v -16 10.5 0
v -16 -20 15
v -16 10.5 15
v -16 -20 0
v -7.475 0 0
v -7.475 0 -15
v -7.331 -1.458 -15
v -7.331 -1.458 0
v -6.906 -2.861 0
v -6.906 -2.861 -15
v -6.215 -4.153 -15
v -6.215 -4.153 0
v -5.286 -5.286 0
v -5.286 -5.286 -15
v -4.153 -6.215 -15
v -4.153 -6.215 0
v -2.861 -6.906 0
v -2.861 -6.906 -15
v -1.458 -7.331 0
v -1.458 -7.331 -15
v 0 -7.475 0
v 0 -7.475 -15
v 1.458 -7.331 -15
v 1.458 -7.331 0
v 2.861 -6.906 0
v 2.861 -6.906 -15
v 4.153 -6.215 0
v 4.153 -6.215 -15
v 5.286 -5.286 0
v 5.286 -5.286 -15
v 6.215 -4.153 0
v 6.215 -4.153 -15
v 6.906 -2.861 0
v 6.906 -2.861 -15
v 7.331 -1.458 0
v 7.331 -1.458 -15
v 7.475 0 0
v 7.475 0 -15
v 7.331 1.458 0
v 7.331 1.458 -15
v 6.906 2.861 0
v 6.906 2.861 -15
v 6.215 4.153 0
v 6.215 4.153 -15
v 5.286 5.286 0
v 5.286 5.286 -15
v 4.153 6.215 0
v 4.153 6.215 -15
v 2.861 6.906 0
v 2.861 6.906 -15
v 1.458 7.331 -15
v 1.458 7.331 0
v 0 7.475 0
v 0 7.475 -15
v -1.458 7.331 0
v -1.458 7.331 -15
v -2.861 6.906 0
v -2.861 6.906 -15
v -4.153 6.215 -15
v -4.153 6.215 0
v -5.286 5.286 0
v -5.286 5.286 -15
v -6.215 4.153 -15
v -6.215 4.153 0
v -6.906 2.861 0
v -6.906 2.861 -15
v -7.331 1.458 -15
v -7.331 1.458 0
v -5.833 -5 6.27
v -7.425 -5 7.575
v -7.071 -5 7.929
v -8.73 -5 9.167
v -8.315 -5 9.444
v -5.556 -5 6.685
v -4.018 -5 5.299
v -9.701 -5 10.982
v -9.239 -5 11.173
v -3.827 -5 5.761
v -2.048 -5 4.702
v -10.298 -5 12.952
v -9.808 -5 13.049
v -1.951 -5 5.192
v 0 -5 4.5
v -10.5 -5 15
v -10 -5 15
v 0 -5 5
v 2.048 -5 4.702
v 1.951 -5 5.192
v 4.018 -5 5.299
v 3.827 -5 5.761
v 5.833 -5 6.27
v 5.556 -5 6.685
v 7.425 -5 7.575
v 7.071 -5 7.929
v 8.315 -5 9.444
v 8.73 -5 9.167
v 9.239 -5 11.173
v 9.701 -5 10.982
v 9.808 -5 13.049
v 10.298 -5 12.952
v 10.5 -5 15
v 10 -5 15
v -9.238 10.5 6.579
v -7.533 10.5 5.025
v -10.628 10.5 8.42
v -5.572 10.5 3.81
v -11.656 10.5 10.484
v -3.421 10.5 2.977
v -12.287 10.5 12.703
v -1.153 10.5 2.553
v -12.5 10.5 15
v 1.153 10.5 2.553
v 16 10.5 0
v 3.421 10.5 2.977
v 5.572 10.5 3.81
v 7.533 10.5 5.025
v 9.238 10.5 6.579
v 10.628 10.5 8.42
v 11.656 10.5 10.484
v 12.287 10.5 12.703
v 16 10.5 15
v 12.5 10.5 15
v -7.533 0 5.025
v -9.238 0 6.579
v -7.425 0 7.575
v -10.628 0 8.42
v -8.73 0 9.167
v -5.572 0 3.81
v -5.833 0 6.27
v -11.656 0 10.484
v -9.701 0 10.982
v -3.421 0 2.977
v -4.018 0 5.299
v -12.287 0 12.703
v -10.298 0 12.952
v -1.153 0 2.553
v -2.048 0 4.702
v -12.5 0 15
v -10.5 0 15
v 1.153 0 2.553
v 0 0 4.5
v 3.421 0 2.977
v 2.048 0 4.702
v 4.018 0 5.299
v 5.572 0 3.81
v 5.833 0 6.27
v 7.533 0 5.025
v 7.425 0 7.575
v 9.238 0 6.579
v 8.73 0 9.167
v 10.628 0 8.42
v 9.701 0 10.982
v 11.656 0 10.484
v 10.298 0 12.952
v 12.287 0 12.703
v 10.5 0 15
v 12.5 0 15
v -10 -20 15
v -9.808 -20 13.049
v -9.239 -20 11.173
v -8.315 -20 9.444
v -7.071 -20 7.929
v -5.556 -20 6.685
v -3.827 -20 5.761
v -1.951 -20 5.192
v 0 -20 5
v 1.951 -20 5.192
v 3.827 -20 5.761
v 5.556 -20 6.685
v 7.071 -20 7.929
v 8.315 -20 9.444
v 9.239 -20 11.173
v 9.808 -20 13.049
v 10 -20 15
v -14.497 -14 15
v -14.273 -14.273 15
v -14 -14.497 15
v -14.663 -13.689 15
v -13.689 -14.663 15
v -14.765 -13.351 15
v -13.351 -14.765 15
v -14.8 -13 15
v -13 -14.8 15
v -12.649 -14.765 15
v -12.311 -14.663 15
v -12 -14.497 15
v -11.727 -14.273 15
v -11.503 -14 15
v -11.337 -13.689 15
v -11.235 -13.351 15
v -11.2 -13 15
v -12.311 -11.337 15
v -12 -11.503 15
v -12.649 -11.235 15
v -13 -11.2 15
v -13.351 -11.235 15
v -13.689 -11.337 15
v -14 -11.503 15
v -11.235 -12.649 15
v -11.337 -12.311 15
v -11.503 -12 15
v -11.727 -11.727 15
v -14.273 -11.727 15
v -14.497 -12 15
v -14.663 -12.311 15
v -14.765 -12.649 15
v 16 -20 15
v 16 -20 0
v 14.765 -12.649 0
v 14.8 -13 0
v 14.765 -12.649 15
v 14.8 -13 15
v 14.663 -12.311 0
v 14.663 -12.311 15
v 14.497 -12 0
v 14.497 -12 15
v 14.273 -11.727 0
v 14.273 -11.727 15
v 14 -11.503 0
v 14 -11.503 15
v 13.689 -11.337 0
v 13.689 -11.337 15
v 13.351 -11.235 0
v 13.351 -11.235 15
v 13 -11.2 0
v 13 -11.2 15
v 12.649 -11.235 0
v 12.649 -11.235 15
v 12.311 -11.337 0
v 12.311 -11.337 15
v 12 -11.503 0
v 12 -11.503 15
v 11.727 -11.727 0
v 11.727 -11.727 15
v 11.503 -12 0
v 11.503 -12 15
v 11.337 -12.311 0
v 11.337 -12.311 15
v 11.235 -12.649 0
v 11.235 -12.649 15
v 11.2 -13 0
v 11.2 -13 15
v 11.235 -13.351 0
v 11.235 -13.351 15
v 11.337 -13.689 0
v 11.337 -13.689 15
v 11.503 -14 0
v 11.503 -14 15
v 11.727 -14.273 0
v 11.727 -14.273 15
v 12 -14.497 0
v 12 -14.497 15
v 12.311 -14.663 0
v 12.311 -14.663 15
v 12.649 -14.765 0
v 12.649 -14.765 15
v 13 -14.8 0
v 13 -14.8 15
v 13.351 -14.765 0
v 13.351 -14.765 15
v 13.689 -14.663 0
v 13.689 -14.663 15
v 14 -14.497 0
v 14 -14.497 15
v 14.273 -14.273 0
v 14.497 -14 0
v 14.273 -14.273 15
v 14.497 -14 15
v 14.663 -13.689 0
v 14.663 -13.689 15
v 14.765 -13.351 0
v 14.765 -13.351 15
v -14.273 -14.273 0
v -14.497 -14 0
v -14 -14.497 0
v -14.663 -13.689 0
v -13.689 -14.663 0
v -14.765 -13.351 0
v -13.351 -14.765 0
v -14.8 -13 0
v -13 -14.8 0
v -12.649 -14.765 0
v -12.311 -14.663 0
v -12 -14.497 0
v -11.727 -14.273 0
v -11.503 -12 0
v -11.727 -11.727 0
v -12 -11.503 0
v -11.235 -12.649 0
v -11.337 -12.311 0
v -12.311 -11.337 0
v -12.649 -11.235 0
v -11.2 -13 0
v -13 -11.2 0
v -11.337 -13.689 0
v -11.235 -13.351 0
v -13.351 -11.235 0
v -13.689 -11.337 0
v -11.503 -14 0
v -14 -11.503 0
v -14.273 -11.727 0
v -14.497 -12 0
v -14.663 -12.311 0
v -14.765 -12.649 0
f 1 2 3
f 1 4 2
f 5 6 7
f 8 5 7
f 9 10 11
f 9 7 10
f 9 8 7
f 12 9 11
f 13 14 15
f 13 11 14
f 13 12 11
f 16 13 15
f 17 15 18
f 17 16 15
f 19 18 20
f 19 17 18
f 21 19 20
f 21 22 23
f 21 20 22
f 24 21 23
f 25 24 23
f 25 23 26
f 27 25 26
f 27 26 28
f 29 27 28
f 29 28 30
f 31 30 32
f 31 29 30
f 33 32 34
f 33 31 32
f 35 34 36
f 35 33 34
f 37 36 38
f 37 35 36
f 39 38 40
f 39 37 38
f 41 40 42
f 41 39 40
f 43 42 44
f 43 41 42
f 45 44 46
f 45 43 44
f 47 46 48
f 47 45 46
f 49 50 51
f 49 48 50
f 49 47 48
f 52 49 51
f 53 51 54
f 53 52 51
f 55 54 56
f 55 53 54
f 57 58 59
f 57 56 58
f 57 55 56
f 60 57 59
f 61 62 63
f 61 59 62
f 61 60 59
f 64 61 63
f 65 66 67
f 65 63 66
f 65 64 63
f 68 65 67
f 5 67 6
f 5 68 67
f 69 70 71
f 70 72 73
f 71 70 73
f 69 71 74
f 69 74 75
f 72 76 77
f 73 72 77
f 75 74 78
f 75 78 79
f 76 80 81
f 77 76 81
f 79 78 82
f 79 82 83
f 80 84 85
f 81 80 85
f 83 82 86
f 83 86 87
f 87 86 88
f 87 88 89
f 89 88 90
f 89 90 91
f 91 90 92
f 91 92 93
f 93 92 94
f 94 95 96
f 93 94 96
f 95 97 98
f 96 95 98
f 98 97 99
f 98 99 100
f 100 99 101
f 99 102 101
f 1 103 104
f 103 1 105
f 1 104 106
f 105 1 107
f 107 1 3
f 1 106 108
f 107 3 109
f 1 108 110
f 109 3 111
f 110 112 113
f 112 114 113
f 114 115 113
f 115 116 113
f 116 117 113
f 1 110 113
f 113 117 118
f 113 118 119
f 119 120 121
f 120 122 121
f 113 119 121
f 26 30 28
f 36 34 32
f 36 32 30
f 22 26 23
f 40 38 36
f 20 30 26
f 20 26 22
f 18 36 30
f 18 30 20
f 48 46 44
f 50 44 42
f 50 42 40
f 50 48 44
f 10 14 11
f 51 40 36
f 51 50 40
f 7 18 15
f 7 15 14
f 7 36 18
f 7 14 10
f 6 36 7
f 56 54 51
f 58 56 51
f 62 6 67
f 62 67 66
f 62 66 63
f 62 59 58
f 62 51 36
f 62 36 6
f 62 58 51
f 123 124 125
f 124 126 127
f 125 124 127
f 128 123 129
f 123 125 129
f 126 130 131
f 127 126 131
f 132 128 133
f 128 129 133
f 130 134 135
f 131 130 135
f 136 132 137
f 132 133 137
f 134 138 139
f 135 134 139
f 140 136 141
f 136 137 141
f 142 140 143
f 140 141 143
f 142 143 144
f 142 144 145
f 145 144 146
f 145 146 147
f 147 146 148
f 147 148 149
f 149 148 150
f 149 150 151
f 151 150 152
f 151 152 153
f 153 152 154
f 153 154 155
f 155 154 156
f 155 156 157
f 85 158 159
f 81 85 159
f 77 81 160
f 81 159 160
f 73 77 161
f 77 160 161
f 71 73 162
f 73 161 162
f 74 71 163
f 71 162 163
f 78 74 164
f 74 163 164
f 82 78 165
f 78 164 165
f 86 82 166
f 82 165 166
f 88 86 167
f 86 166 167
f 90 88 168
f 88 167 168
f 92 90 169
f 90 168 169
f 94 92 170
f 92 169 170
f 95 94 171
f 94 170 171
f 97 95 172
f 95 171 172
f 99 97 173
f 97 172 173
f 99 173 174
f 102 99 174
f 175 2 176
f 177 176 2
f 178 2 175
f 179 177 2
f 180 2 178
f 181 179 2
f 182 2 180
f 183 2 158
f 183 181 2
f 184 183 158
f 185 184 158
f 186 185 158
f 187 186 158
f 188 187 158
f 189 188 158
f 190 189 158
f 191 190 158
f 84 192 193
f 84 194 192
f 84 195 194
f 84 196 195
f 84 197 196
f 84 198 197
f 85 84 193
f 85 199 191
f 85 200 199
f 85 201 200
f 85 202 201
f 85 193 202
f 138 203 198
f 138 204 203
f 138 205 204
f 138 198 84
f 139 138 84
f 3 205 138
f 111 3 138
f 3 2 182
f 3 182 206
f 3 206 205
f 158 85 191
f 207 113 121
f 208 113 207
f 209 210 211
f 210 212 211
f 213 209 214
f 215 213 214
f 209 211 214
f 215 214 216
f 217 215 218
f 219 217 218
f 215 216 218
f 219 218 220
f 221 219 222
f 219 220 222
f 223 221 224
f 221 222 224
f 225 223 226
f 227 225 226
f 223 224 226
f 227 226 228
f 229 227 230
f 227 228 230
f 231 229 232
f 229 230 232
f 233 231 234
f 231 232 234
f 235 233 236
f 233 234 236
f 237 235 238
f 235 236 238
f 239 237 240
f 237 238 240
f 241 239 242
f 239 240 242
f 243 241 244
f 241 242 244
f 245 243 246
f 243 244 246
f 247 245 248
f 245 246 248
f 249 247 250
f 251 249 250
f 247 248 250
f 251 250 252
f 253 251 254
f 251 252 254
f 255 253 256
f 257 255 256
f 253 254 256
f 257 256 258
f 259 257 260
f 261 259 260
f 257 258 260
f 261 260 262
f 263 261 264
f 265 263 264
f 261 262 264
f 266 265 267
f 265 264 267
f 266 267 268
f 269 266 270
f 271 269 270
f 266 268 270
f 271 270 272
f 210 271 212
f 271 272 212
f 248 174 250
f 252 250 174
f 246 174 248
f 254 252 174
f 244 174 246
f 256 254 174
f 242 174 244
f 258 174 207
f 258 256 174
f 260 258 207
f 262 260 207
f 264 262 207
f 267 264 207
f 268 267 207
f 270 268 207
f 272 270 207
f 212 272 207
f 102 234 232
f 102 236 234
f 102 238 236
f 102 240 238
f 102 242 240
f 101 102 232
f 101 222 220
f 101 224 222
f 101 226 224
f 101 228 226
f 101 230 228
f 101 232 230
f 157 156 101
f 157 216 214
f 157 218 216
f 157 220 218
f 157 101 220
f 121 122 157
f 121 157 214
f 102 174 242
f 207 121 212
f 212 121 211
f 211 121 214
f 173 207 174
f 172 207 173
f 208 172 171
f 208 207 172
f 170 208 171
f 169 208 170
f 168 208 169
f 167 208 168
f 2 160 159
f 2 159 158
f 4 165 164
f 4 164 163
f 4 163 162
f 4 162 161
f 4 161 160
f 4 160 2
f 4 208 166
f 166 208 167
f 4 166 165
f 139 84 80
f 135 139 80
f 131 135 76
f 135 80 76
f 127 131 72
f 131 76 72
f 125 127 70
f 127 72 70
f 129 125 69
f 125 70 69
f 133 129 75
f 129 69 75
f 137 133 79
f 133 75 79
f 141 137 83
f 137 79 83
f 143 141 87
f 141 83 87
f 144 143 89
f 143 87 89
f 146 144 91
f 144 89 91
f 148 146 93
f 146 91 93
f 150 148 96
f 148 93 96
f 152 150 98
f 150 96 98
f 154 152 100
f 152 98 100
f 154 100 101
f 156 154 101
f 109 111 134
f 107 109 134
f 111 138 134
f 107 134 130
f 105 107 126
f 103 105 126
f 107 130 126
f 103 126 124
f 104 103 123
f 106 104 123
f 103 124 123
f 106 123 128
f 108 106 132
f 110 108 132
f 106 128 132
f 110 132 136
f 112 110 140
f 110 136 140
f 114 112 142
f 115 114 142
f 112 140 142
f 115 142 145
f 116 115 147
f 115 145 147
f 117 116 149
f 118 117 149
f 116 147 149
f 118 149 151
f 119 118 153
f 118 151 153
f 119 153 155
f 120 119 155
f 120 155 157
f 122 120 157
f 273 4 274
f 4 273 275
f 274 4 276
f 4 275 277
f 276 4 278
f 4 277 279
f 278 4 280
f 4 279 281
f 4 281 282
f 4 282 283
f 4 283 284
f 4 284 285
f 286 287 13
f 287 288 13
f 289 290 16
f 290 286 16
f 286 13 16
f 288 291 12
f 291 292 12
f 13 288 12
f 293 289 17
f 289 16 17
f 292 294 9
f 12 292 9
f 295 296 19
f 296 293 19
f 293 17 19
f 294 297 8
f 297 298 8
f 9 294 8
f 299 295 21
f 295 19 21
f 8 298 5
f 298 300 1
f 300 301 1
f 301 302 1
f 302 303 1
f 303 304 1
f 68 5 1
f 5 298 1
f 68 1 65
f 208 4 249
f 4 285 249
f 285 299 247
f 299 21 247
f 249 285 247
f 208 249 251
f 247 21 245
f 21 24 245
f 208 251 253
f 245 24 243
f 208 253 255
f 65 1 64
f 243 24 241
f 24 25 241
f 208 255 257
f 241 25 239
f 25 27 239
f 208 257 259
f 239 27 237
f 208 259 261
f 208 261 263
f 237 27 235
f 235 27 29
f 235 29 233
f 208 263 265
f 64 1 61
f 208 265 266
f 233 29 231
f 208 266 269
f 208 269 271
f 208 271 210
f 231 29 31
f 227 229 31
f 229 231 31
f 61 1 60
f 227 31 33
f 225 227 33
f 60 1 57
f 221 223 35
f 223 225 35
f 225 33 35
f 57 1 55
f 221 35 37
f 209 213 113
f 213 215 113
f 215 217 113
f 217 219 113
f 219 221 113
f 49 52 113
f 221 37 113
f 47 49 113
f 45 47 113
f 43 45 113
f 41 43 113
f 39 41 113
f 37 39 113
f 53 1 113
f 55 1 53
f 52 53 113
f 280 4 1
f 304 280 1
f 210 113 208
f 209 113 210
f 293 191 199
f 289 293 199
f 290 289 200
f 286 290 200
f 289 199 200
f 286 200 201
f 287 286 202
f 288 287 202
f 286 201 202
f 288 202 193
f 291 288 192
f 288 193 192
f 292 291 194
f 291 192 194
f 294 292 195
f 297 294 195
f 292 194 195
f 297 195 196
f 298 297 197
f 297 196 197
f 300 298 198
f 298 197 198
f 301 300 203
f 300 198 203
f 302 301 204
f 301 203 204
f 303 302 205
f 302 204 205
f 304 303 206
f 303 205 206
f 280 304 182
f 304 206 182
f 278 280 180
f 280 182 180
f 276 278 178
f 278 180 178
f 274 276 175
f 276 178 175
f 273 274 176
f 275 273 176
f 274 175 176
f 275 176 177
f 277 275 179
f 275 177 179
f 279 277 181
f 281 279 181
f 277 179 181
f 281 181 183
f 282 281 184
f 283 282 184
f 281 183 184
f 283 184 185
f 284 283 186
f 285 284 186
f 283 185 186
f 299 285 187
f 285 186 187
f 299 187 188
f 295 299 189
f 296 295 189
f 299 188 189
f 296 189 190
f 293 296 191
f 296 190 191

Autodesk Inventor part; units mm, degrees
ref_plane "YZ Plane" through (0, 0, 0) normal (1, 0, 0) x (0, 1, 0)
ref_plane "XZ Plane" through (0, 0, 0) normal (0, 1, 0) x (-1, 0, 0)
ref_plane "XY Plane" through (0, 0, 0) normal (0, 0, 1) x (1, 0, 0)
sketch "Skizze1" plane through (0, 0, 0) normal (0, 0, 1) x (1, 0, 0)
  line L0 (-16, 20) -> (16, 20)
  line L1 (16, 20) -> (16, -20)
  line L2 (16, -20) -> (-16, -20)
  line L3 (-16, -20) -> (-16, 20)
  line L4 (-16, 20) -> (16, -20) construction
  line L5 (16, 20) -> (-16, -20) construction
  point P0 (0, 0)
  dimension "d0" = 32
  dimension "d1" = 40
extrude "Extrusion1" add sketch "Skizze1" along normal blind 15
sketch "Skizze2" plane through (-16, -20, 0) normal (0, -1, 0) x (1, 0, 0)
  line L0 (0, 15) -> (32, 15) projected
  line L1 (0, 0) -> (0, 15) projected
  line L2 (32, 0) -> (0, 0) projected
  line L3 (32, 0) -> (32, 15) projected
  line L4 (32, 15) -> (0, 15) projected
  circle A0 centre (16, 15) radius 10
  point P0 (16, 0)
  dimension "d4" = 20
extrude "Extrusion2" cut sketch "Skizze2" against normal blind 15 contours A0 L0 | L0 A0
sketch "Skizze3" plane through (-16, -5, 0) normal (0, -1, 0) x (1, 0, 0)
  line L0 (0, 0) -> (0, 15) projected
  line L1 (32, 0) -> (0, 0) projected
  line L2 (32, 0) -> (32, 15) projected
  line L3 (26, 15) -> (32, 15) projected
  line L4 (0, 15) -> (6, 15) projected
  line L5 (6, 15) -> (26, 15) projected
  circle A0 centre (16, 15) radius 10.5
  point P0 (16, 0)
  dimension "d7" = 21
extrude "Extrusion3" cut sketch "Skizze3" against normal blind 5 contours A0 L3 L5 L4 | L4 L5 L3 A0
sketch "Skizze4" plane through (-16, 0, 0) normal (0, -1, 0) x (1, 0, 0)
  line L0 (5.5, 15) -> (26.5, 15) projected
  circle A0 centre (16, 15) radius 12.5
  point P0 (16, 0)
  dimension "d10" = 25
extrude "Extrusion4" cut sketch "Skizze4" against normal through all
sketch "Skizze5" plane through (0, 0, 15) normal (0, 0, 1) x (1, 0, 0)
  line L0 (-16, 20) -> (-16, -20) projected
  line L1 (-16, -20) -> (-10, -20) projected
  line L2 (-10, -20) -> (-10, -5) projected
  line L3 (10, -5) -> (10, -20) projected
  line L4 (10, -20) -> (16, -20) projected
  line L5 (16, -20) -> (16, 20) projected
  circle A0 centre (-13, -13) radius 1.8
  circle A1 centre (13, -13) radius 1.8
  point P0 (0, 0)
  dimension "d13" = 3.6
  dimension "d14" = 3.6
  dimension "d15" = 7
  dimension "d16" = 7
  dimension "d17" = 3
  dimension "d18" = 3
extrude "Extrusion5" cut sketch "Skizze5" against normal through all
sketch "Skizze8" plane through (0, 0, 0) normal (0, 0, -1) x (-1, 0, 0)
  line L0 (12.5, 20) -> (16, 20) projected
  line L1 (16, 20) -> (16, 10.5)
  line L2 (16, 20) -> (16, -20) projected
  line L3 (16, 10.5) -> (-16, 10.5)
  line L4 (-16, 20) -> (-16, -20) projected
  line L5 (16, 20) -> (-16, 20) projected
  line L6 (-16, 20) -> (16, 20)
  point P0 (0, 0)
  dimension "d28" = 9.5
extrude "Extrusion8" cut sketch "Skizze8" along normal mid plane 58.75
sketch "Skizze9" plane through (0, 0, 0) normal (0, 0, -1) x (-1, 0, 0)
  circle A0 centre (0, 0) radius 7.475
  dimension "d31" = 14.95
extrude "Extrusion9" add sketch "Skizze9" along normal blind 15
properties part number "5 Objektivhalterung unten"
